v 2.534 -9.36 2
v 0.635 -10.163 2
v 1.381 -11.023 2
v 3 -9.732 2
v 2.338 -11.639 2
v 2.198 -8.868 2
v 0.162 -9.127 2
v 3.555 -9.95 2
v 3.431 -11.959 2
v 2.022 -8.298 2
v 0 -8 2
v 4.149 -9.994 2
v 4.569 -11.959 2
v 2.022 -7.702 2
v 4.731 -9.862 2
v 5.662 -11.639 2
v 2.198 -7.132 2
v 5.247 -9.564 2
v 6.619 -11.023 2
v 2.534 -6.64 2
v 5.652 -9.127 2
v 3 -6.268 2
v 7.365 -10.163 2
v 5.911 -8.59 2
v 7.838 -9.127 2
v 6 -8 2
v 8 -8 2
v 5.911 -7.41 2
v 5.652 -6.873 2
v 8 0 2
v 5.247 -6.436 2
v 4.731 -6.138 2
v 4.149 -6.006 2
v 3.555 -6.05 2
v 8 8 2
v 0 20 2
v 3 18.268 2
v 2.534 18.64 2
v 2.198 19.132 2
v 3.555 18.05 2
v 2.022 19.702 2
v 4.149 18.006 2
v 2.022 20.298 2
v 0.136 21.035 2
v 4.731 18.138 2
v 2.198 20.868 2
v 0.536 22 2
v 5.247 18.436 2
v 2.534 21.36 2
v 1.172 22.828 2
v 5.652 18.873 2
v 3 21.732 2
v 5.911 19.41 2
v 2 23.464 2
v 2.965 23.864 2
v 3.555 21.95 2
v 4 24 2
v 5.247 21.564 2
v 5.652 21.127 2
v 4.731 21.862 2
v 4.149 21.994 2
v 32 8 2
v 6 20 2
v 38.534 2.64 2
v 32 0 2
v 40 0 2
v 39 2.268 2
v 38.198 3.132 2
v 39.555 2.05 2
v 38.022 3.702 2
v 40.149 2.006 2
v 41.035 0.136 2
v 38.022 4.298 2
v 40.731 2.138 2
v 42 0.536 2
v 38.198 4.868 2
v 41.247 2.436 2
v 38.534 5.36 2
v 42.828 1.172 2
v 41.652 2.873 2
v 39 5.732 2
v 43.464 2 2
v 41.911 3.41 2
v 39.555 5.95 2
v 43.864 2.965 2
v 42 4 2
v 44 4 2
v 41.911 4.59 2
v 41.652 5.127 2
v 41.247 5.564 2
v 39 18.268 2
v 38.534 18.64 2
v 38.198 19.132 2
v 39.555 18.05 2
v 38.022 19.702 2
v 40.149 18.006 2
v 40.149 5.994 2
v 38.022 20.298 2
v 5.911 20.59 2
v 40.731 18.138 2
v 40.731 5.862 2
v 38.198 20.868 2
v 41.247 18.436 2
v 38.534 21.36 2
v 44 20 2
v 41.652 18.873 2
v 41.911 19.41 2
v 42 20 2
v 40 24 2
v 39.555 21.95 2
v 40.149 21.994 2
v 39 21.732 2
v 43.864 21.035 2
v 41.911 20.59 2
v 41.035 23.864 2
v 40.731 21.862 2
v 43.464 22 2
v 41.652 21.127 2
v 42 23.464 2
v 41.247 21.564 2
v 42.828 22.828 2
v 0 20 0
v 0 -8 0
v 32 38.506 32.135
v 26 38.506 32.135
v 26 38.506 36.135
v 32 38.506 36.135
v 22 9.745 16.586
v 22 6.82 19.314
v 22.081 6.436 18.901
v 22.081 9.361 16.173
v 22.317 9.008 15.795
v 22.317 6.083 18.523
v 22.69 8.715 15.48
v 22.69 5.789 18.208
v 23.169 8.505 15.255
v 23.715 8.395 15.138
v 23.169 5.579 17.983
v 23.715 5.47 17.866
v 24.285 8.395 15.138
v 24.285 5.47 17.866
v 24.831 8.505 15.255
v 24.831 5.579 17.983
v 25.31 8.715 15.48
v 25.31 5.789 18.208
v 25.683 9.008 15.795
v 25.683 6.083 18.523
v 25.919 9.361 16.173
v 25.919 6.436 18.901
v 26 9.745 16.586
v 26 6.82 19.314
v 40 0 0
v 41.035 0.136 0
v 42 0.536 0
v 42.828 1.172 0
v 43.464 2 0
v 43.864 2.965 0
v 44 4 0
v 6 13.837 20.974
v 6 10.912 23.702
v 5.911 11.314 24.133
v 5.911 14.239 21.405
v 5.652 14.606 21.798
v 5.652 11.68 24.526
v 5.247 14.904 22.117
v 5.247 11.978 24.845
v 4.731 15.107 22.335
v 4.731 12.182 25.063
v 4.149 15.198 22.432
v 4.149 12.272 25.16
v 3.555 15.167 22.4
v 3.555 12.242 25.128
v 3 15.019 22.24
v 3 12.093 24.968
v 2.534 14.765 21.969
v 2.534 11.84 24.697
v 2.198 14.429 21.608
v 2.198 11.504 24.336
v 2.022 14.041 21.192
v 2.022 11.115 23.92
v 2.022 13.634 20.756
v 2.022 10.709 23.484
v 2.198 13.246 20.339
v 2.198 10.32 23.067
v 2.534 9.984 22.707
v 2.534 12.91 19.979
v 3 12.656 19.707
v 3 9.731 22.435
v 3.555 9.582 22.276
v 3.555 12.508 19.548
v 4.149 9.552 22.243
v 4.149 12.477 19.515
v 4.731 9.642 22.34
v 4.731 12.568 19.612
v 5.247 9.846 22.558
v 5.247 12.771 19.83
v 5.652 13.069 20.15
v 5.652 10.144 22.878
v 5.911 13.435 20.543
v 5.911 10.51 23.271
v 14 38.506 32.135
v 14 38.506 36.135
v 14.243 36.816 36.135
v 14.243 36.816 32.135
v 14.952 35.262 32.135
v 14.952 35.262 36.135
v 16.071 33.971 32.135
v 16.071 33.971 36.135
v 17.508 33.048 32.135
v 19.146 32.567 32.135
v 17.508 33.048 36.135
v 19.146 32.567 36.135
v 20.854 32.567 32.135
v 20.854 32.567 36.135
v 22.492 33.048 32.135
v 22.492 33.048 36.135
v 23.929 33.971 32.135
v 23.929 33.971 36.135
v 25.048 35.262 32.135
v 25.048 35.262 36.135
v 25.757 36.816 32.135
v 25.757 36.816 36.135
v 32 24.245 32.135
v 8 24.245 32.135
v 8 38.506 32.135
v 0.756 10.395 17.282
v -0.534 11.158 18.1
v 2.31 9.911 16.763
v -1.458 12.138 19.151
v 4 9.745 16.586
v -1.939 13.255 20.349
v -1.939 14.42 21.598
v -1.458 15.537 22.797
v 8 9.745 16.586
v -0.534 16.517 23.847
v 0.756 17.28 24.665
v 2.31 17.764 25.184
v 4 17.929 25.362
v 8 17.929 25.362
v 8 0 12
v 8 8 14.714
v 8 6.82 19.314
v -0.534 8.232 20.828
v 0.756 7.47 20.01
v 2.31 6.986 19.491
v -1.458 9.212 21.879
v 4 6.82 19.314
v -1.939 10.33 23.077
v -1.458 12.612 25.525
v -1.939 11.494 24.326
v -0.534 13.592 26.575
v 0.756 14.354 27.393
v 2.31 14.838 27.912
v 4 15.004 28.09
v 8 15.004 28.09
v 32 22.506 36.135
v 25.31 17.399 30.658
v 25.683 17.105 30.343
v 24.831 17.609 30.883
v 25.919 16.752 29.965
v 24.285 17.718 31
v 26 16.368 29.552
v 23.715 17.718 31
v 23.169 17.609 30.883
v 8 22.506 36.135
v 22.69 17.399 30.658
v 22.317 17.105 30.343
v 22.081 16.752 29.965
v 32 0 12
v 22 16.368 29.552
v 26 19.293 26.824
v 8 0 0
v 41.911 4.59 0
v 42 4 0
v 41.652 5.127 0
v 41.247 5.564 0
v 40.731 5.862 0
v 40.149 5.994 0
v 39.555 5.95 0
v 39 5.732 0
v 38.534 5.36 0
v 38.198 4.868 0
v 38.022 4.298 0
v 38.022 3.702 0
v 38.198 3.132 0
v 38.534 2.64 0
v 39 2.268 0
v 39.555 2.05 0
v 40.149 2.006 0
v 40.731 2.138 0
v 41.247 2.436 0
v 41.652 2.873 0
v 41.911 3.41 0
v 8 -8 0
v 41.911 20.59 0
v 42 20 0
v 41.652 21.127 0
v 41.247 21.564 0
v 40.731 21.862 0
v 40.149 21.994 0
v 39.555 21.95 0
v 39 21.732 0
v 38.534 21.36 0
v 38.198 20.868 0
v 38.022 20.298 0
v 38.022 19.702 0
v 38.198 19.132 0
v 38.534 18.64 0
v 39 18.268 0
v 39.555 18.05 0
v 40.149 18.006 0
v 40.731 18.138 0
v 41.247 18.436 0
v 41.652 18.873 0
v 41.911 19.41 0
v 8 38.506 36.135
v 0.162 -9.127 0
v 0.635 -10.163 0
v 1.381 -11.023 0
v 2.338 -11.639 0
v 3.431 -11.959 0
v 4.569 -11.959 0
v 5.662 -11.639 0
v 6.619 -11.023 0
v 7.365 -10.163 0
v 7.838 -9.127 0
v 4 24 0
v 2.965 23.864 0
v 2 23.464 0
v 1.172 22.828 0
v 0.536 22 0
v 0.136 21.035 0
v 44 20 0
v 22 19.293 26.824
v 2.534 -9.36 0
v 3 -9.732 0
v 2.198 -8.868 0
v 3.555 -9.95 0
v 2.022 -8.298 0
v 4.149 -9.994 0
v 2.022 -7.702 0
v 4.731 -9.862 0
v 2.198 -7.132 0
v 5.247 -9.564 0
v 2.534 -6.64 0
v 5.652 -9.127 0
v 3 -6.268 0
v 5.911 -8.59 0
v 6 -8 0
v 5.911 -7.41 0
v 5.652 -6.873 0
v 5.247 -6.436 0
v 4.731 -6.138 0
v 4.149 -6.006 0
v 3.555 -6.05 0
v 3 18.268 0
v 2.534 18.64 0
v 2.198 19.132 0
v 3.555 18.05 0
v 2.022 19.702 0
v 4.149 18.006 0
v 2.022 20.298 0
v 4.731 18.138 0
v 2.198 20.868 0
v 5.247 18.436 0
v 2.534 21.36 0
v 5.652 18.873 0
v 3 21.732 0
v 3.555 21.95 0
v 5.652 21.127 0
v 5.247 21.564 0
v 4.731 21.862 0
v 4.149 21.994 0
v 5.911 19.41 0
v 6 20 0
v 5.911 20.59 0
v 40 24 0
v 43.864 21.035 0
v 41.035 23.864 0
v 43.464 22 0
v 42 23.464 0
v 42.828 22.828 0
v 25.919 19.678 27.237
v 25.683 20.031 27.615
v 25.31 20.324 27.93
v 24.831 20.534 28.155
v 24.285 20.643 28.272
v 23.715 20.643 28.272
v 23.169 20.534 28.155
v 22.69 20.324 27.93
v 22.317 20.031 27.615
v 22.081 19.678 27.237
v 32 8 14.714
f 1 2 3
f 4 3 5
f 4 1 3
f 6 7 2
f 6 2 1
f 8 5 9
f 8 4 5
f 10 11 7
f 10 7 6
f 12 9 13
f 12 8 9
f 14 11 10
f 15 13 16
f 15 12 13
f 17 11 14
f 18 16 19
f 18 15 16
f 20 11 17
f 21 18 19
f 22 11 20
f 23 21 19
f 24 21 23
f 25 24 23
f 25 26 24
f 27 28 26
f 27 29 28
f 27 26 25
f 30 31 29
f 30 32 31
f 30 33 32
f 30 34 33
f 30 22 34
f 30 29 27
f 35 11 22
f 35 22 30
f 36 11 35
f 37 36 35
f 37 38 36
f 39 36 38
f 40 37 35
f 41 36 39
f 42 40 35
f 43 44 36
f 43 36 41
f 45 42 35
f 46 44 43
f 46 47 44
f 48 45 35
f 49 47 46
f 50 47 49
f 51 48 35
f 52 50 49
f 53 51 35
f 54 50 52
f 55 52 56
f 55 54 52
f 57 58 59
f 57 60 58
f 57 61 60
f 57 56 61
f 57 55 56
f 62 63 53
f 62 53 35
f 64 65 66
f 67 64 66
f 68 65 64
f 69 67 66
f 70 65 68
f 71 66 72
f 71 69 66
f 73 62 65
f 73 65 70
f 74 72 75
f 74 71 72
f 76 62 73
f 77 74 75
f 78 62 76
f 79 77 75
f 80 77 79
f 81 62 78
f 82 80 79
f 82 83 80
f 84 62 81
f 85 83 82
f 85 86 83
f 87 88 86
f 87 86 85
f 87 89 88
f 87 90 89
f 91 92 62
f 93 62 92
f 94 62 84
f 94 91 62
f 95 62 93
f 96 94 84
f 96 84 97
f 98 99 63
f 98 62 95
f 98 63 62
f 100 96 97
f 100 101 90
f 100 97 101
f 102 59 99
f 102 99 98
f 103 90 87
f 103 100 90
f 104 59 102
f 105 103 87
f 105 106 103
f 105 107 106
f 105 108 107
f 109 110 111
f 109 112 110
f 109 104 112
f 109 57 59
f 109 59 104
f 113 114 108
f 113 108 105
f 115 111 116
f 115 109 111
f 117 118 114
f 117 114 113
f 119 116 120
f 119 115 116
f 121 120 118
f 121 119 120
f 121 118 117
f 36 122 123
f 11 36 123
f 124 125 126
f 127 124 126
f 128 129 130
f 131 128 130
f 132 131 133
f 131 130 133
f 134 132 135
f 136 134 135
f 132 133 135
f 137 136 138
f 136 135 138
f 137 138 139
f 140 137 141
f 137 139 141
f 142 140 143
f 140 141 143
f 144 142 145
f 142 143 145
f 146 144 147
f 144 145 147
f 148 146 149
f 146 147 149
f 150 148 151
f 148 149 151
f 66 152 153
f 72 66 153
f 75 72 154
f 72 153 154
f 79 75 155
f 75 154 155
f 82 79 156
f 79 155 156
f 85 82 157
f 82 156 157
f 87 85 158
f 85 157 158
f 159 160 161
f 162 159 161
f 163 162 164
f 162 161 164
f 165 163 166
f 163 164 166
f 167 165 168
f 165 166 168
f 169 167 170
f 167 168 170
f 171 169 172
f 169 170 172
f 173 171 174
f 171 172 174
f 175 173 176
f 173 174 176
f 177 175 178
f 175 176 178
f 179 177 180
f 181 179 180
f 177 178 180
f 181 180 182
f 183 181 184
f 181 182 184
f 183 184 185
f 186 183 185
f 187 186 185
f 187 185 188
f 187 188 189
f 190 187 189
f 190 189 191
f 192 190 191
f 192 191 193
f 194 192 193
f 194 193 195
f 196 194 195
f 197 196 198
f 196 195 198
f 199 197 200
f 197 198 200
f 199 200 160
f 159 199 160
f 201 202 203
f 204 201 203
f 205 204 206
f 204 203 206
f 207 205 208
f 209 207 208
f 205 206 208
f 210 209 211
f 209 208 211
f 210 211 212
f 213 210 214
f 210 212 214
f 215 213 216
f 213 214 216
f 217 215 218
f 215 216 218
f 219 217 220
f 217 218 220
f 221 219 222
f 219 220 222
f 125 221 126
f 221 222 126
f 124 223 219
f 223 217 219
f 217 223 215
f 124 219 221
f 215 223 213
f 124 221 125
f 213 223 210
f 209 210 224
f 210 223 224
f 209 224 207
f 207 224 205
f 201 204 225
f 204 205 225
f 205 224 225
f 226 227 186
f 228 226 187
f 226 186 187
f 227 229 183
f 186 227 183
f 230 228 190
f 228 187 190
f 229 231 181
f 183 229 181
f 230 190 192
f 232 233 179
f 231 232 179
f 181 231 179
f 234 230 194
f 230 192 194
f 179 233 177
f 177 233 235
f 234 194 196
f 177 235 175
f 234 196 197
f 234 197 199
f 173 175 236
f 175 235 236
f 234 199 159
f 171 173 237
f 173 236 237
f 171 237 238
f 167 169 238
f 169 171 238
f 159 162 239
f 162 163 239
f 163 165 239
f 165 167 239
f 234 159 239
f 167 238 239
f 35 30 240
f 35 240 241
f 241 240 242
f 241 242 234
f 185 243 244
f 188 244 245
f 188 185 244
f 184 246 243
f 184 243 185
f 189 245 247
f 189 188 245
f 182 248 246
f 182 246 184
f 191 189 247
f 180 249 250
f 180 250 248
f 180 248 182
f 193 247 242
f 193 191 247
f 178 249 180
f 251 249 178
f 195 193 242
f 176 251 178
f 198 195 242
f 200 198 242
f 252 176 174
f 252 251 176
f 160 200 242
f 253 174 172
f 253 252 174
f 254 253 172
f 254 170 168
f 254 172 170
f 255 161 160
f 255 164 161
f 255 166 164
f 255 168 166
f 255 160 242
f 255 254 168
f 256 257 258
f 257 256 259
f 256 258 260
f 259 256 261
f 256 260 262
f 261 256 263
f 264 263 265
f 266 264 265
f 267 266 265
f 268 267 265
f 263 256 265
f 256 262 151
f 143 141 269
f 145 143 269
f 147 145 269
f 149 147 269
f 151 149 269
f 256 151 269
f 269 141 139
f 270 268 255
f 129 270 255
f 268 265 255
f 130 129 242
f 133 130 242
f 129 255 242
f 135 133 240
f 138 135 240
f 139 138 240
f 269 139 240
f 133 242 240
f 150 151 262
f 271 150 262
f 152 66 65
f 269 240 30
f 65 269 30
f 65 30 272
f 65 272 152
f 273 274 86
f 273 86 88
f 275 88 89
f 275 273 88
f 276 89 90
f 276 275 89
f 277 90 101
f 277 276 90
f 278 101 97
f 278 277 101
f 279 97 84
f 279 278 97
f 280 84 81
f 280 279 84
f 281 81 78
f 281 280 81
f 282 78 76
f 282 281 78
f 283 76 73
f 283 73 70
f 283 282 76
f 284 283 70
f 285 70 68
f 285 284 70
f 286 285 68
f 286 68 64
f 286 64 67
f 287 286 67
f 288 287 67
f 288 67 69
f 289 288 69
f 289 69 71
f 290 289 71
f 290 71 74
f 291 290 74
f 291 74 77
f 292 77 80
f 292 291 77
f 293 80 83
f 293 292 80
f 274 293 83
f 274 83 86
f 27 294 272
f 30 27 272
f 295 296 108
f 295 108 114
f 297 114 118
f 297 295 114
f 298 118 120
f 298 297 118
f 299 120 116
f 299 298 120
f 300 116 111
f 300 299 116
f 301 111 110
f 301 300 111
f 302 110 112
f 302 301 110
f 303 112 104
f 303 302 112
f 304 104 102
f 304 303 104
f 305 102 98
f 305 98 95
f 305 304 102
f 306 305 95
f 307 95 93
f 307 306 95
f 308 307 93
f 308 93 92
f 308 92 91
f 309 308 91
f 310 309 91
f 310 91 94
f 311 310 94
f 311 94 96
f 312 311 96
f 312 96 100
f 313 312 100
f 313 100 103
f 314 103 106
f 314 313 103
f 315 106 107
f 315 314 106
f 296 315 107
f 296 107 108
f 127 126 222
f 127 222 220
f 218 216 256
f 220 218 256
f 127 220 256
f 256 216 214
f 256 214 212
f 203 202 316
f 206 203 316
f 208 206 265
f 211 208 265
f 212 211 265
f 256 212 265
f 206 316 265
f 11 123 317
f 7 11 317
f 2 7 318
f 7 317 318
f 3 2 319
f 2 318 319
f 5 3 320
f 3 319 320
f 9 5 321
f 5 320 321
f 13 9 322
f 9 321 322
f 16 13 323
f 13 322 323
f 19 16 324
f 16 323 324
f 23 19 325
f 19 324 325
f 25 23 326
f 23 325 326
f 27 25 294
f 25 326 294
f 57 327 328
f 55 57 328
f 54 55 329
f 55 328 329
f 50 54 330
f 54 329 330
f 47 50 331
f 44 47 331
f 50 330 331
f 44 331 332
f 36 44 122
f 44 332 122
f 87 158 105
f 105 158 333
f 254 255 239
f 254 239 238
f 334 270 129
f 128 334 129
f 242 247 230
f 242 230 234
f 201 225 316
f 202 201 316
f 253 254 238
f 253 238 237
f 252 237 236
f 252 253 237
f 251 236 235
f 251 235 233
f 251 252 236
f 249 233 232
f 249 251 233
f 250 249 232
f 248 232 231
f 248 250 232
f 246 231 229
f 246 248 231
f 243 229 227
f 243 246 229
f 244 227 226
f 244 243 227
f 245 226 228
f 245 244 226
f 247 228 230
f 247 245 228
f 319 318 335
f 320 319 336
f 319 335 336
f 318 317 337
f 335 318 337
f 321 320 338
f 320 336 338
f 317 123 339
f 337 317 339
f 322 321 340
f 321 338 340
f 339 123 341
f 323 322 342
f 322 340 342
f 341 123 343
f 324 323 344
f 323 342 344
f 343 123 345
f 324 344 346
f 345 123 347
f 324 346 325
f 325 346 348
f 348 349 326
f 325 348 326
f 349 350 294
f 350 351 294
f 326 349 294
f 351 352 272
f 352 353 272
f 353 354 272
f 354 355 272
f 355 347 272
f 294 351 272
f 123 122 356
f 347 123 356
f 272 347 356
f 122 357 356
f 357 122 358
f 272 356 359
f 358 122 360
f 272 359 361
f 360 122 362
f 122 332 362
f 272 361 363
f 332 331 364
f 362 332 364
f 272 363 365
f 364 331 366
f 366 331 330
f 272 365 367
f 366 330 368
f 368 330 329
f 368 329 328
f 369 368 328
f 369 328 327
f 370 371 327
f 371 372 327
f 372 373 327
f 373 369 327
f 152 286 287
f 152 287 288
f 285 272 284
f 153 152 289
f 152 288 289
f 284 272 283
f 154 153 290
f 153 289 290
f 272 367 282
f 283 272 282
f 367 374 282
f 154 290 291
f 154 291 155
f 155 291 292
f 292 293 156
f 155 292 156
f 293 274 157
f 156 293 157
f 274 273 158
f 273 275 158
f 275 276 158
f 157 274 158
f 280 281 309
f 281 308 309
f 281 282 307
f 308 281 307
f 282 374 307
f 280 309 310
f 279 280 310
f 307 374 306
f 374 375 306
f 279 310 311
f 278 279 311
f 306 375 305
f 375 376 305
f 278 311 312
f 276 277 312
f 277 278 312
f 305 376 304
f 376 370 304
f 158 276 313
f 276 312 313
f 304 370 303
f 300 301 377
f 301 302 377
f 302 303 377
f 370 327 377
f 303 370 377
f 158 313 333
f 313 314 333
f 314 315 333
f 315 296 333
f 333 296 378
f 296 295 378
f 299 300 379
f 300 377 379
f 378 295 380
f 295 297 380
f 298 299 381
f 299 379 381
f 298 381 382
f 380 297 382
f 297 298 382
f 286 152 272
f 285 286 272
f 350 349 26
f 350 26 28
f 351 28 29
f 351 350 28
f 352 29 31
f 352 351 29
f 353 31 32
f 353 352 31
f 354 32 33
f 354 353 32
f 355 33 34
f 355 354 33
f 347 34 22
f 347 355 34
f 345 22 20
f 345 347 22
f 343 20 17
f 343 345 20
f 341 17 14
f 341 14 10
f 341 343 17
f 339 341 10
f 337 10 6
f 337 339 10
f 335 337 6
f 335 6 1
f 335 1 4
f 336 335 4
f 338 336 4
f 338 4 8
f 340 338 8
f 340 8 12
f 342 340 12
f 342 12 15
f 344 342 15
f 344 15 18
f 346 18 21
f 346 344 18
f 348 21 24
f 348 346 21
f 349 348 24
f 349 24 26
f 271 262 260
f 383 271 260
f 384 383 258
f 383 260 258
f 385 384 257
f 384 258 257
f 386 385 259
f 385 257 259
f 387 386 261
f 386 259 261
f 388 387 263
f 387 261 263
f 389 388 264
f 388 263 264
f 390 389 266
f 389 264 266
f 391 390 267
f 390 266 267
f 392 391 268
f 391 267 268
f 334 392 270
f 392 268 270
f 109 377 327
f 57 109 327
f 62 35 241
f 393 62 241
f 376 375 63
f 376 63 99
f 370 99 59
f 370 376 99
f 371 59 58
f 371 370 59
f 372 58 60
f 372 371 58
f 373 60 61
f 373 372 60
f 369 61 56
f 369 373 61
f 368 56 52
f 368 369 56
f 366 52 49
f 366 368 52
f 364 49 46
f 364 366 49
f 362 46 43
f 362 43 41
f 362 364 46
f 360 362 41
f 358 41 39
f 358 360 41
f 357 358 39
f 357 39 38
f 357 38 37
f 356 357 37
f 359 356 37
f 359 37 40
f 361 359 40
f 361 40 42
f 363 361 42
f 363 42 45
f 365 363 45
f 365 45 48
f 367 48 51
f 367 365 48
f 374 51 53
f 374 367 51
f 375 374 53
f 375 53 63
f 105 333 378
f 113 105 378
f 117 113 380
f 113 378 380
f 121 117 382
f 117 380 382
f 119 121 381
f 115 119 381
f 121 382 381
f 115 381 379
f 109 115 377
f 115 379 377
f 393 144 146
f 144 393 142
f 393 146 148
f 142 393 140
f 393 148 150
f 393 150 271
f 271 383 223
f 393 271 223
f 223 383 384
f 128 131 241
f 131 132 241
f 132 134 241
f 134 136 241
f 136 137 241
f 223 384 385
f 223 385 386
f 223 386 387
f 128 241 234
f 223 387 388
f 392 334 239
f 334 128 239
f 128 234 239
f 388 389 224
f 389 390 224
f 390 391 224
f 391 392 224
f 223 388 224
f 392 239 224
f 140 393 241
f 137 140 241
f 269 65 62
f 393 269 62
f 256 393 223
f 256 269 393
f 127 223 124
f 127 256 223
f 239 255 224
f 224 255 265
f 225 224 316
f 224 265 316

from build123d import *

# Parameters (mm, degrees)
F0_R     = 2
F1_DEPTH = 2
F3_DEPTH = 24
F4_R     = 2
F5_DEPTH = 4
F6_DEPTH = 4
F8_DEPTH = 10


with BuildPart() as f1:
    # F0 (on Top) → F1 (new body)
    with BuildSketch(Plane.XY):
        with BuildLine():
            Line((8, 0), (0, 0))
            Line((0, 0), (0, -8))
            ThreePointArc((0, -8), (4, -12), (8, -8))
            Line((8, -8), (8, 0))
        make_face()
        with Locations((4, -8)):
            Circle(F0_R, mode=Mode.SUBTRACT)
        with BuildLine():
            Line((0, 20), (0, 0))
            Line((0, 0), (8, 0))
            Line((8, 0), (40, 0))
            ThreePointArc((40, 0), (42.8284271247, 1.1715728753), (44, 4))
            Line((44, 4), (44, 20))
            ThreePointArc((44, 20), (42.8284271247, 22.8284271247), (40, 24))
            Line((40, 24), (4, 24))
            ThreePointArc((4, 24), (1.1715728753, 22.8284271247), (0, 20))
        make_face()
        with Locations((40, 4)):
            Circle(F0_R, mode=Mode.SUBTRACT)
        with Locations((4, 20)):
            Circle(F0_R, mode=Mode.SUBTRACT)
        with Locations((40, 20)):
            Circle(F0_R, mode=Mode.SUBTRACT)
    extrude(amount=F1_DEPTH)

    # F2 (on face) → F3 (join)
    with BuildSketch(Plane.YZ.offset(8)):
        Polygon((0, 12), (0, 2), (8, 2), (8, 14.7138329376), (24.2451953819, 32.1346721534), (38.5059458821, 32.1346721534), (38.5059458821, 36.1346721534), (22.5059458821, 36.1346721534), align=None)
    extrude(amount=F3_DEPTH)

    # F4 (on face) → F5 (join)
    with BuildSketch(Plane(origin=(0, -5.9853843016, 5.5814611575), x_dir=(1, 0, 0), z_dir=(0, -0.7313537016, 0.6819983601))):
        with BuildLine():
            Line((8, 18.7762444194), (8, 30.7762444194))
            Line((8, 30.7762444194), (4, 30.7762444194))
            ThreePointArc((4, 30.7762444194), (-2, 24.7762444194), (4, 18.7762444194))
            Line((4, 18.7762444194), (8, 18.7762444194))
        make_face()
        with Locations((4, 24.7762444194)):
            Circle(F4_R, mode=Mode.SUBTRACT)
    extrude(amount=-F5_DEPTH)

    # F4 (on face) → F6 (cut, through all)
    with BuildSketch(Plane(origin=(0, -5.9853843016, 5.5814611575), x_dir=(1, 0, 0), z_dir=(0, -0.7313537016, 0.6819983601))):
        with BuildLine():
            ThreePointArc((26, 32.7762444194), (24, 34.7762444194), (22, 32.7762444194))
            Line((22, 32.7762444194), (22, 18.7762444194))
            ThreePointArc((22, 18.7762444194), (24, 16.7762444194), (26, 18.7762444194))
            Line((26, 18.7762444194), (26, 32.7762444194))
        make_face()
    extrude(amount=-F6_DEPTH, mode=Mode.SUBTRACT)

    # F7 (on face) → F8 (cut)
    with BuildSketch(Plane.XY.offset(36.1346721534)):
        with BuildLine():
            Line((14, 38.5059458821), (26, 38.5059458821))
            ThreePointArc((26, 38.5059458821), (20, 44.5059458821), (14, 38.5059458821))
        make_face()
        with BuildLine():
            ThreePointArc((14, 38.5059458821), (20, 32.5059458821), (26, 38.5059458821))
            Line((26, 38.5059458821), (14, 38.5059458821))
        make_face()
    extrude(amount=-F8_DEPTH, mode=Mode.SUBTRACT)


solid = f1.part
